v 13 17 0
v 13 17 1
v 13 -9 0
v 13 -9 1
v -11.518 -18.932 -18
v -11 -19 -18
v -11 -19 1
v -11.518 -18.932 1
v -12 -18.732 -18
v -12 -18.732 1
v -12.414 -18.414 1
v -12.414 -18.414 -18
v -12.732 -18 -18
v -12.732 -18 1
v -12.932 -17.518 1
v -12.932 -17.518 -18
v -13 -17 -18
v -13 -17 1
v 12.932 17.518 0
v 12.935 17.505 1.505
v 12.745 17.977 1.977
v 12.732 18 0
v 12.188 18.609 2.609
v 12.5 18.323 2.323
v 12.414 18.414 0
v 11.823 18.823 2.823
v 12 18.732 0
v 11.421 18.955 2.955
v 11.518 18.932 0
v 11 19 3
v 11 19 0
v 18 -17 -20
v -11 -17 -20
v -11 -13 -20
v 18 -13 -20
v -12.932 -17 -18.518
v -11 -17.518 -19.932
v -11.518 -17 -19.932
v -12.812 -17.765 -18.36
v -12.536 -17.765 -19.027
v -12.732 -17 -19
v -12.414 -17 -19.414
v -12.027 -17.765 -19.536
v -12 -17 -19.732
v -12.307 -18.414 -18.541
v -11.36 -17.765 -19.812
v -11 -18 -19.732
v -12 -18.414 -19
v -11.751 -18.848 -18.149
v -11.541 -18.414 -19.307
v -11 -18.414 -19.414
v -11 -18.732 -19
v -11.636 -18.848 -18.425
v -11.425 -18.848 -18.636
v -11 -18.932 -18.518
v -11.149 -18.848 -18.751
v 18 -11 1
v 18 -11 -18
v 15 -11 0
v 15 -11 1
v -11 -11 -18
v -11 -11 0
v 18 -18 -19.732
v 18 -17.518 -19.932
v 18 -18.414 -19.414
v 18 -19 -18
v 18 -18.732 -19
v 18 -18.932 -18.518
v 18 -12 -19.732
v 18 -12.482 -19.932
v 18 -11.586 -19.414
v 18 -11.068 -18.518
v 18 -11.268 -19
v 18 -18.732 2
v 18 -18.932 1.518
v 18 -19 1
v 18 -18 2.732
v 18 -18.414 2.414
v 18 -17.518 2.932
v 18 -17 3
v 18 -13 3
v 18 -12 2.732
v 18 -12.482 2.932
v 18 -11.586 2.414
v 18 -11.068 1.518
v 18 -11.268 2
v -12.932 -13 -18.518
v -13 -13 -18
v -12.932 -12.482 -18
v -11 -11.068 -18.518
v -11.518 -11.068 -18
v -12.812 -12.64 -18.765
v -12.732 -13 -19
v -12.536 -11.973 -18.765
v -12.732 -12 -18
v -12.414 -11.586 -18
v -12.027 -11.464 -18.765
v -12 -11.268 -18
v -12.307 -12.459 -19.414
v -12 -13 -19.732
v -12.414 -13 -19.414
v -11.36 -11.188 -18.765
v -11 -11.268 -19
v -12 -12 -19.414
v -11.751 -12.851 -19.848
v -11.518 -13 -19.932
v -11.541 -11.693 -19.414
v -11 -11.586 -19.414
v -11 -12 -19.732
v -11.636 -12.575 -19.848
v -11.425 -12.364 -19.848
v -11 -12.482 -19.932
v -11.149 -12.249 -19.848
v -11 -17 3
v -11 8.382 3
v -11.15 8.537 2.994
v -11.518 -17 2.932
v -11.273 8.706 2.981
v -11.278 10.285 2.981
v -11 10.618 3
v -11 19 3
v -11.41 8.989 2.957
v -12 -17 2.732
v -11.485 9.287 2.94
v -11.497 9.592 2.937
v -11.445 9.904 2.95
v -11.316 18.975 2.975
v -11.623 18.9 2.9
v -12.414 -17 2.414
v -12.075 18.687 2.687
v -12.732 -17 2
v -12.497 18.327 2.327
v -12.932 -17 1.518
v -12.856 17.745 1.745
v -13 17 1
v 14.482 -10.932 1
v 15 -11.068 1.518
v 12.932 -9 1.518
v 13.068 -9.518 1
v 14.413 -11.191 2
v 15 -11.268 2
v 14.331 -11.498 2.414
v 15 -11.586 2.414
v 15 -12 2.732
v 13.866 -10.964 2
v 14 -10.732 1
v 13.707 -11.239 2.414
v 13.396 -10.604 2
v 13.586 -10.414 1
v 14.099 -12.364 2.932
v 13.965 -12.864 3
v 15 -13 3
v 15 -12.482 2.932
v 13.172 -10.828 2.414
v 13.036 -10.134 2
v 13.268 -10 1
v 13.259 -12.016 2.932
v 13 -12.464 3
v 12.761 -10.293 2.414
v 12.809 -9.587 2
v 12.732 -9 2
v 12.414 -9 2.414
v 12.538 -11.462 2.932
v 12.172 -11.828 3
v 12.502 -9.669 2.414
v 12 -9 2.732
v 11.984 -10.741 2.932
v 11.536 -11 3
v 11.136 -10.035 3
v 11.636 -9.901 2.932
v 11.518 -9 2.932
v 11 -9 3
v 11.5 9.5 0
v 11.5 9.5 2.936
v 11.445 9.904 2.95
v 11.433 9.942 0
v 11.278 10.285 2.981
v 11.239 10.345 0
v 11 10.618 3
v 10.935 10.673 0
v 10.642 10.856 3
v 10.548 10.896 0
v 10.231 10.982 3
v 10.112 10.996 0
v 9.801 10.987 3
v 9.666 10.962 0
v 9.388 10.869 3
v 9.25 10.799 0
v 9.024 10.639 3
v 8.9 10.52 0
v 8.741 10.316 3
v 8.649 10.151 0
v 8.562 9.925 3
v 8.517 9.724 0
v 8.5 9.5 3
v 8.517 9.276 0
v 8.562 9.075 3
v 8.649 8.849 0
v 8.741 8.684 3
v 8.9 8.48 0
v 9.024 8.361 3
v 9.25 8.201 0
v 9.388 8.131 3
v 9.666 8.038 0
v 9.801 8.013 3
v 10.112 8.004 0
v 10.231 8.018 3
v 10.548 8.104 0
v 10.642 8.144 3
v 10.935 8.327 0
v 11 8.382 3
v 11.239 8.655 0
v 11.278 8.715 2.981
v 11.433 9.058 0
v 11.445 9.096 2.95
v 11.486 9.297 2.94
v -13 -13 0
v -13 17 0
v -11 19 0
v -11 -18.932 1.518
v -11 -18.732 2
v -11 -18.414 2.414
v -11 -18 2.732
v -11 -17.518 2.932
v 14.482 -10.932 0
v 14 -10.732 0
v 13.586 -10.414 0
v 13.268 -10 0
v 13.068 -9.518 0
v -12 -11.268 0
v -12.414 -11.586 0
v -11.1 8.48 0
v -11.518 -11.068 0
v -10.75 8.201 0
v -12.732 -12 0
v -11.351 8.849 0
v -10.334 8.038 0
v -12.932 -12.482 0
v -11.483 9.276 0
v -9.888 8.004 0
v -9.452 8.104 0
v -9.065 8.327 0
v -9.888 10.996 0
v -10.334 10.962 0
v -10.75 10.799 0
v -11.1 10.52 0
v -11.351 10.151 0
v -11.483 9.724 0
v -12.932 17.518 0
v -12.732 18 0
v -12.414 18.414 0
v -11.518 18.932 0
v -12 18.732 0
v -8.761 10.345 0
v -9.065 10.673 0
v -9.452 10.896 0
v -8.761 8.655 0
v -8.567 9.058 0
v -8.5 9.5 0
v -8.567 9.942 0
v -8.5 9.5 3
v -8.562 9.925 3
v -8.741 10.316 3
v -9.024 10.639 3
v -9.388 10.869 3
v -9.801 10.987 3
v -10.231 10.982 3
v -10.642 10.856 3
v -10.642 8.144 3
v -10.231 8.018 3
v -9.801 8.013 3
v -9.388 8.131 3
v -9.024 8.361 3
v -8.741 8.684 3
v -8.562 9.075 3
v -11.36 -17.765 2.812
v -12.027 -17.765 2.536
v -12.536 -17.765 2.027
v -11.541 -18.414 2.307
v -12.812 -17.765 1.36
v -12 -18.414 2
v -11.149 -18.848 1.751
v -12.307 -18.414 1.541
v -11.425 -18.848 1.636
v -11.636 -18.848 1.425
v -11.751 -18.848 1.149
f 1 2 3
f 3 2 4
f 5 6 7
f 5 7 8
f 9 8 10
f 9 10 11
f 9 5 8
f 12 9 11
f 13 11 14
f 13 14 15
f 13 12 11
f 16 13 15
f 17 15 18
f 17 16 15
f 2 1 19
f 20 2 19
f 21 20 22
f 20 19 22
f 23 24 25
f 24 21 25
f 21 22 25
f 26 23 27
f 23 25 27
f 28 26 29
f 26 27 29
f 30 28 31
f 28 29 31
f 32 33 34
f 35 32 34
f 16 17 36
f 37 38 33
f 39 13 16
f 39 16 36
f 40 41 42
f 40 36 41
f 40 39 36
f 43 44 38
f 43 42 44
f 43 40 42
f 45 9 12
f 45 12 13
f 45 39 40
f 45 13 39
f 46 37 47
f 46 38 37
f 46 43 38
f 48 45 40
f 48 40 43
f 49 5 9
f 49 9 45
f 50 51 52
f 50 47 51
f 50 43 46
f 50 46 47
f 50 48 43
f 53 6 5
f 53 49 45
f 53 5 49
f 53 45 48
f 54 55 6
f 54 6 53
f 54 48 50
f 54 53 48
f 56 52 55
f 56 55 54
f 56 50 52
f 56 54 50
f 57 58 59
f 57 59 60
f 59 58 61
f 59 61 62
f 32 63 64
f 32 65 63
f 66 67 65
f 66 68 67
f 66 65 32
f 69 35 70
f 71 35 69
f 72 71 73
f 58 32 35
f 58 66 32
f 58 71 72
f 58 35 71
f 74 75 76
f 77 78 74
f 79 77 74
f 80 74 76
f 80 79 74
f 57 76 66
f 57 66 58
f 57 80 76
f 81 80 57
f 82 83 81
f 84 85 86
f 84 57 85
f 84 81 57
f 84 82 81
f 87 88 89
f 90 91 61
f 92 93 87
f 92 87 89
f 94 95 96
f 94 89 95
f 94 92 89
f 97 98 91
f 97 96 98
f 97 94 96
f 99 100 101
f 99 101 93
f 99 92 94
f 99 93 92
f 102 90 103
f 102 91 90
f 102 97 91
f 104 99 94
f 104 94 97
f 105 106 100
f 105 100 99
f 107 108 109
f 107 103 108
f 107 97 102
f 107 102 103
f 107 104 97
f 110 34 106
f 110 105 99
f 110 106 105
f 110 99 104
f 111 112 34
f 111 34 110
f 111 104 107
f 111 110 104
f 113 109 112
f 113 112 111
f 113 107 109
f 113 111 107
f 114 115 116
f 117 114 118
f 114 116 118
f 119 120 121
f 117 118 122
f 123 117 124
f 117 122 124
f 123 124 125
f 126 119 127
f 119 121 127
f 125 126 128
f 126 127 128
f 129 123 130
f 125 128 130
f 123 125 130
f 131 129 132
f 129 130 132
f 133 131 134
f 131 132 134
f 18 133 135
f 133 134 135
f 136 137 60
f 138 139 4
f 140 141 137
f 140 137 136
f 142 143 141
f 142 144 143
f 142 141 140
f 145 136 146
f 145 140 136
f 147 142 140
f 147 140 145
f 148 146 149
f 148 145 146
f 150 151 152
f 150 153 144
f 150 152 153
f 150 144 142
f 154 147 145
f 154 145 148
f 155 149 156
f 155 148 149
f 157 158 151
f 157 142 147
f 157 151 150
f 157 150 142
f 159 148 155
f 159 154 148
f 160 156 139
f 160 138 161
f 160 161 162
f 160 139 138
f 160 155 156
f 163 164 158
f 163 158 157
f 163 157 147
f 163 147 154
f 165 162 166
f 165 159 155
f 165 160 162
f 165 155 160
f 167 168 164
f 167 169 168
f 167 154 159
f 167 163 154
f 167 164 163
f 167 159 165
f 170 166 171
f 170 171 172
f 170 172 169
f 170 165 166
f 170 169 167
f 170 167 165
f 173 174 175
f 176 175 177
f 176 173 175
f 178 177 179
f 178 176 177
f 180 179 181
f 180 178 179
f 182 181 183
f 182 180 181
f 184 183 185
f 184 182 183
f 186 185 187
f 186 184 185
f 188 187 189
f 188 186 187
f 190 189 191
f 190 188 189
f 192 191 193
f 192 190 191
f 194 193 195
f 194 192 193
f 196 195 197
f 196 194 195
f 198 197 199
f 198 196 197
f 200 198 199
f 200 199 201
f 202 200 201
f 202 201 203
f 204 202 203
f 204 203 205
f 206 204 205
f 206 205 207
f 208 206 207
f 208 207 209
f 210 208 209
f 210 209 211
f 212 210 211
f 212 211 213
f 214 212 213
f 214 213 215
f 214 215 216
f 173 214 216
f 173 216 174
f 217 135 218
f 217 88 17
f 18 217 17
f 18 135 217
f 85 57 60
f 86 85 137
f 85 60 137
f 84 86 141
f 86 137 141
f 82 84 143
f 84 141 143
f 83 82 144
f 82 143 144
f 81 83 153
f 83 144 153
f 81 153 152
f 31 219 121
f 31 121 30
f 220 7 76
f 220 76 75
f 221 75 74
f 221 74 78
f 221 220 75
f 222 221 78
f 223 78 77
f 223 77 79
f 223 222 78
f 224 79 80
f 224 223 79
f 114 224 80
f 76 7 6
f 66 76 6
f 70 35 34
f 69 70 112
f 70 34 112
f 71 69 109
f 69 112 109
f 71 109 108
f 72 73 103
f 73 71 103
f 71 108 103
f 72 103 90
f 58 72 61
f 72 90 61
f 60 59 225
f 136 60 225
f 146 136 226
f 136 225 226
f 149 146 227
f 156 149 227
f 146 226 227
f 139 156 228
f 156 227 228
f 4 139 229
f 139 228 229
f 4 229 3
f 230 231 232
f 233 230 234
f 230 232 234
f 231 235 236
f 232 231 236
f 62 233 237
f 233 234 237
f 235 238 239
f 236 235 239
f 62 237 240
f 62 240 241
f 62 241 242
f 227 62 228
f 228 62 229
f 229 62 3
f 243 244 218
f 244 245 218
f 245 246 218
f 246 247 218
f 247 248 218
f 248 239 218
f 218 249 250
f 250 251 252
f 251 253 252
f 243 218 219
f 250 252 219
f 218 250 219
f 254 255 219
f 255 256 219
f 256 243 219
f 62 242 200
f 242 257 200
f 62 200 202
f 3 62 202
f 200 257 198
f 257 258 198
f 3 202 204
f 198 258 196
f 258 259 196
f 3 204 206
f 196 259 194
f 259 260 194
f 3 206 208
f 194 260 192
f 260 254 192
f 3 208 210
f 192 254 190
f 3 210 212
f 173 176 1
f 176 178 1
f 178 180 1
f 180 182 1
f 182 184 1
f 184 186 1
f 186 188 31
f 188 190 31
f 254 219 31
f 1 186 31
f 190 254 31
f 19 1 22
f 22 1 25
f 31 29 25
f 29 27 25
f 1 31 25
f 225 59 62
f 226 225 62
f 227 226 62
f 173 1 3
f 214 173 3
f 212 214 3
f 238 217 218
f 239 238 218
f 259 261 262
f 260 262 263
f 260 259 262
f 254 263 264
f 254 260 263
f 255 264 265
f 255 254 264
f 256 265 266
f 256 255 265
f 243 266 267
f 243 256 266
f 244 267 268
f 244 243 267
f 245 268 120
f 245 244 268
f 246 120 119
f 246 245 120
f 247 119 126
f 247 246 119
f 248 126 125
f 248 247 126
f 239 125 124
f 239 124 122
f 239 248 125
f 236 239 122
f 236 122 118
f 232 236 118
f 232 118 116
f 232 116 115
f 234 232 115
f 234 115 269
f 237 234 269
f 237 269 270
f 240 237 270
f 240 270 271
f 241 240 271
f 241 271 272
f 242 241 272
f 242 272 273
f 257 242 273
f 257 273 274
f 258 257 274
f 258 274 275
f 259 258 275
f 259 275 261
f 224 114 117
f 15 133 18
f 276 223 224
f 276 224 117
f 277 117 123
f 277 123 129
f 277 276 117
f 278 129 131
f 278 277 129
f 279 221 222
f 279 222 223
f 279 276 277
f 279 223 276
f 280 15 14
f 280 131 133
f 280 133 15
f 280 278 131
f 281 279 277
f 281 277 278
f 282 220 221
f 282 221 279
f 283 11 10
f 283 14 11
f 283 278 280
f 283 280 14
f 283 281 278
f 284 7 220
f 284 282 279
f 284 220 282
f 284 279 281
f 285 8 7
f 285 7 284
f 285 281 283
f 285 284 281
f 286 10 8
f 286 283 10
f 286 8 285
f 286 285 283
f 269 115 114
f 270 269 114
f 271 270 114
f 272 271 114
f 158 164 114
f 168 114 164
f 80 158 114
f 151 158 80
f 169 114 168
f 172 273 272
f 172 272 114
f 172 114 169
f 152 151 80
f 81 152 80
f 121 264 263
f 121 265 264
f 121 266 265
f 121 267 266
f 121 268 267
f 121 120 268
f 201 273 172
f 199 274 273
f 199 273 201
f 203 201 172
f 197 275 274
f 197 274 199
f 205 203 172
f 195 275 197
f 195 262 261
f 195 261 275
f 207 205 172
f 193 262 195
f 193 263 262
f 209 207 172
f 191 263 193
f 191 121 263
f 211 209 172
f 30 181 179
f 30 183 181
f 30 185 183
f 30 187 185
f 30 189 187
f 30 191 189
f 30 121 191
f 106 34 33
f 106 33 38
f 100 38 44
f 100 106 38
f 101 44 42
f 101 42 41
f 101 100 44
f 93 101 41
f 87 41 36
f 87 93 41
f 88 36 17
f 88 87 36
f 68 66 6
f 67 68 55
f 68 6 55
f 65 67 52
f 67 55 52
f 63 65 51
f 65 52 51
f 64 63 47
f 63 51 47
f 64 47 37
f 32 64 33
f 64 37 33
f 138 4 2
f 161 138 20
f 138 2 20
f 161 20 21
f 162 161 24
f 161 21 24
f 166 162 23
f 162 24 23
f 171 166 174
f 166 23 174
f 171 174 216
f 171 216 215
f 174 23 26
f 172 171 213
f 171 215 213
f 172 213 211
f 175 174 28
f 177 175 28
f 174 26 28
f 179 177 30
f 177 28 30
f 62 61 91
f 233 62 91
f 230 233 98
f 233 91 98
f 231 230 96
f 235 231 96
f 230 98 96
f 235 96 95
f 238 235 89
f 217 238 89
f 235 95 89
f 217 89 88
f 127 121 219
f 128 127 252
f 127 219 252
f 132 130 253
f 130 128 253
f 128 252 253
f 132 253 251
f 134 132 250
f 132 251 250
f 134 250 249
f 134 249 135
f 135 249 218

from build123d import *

# Parameters (mm, degrees)
F0_W         = 26
F0_H         = 38
F0_R         = 1.5
F1_DEPTH     = 3
F2_W         = 26
F2_H         = 8
F3_DEPTH     = 20
F5_DEPTH     = 5
F6_T1_DEPTH  = 3
F6_T3_DEPTH  = 18
F6_T5_DEPTH  = 19
F6_T7_DEPTH  = 13
F6_T9_DEPTH  = 41
F6_T11_DEPTH = 33
F6_T13_DEPTH = 34
F6_T15_DEPTH = 4
F6_T17_DEPTH = 8
F6_S21_W     = 2.04
F6_S21_H     = 2.04
F6_T22_DEPTH = 2.04
F6_S27_W     = 2.04
F6_S27_H     = 2.04
F6_T28_DEPTH = 2.04
F6_S33_W     = 2.04
F6_S33_H     = 2.04
F6_T34_DEPTH = 2.04
F6_T38_ANGLE = 90


# Not quite as in the source:
# - a fillet or chamfer that OpenCascade refuses, or shapes differently, is made with other operations: its cross-section is extruded or revolved along the edge and cut away or added


with BuildPart() as f1:
    # F0 (on Top) → F1 (new body)
    with BuildSketch(Plane.XY):
        Rectangle(F0_W, F0_H)
        with Locations((-10, 9.5)):
            Circle(F0_R, mode=Mode.SUBTRACT)
        with Locations((10, 9.5)):
            Circle(F0_R, mode=Mode.SUBTRACT)
    extrude(amount=F1_DEPTH)

    # F2 (on face) → F3 (join)
    with BuildSketch(Plane(origin=(0, 0, 0), x_dir=(1, 0, 0), z_dir=(0, 0, -1))):
        with Locations((0, 15)):
            Rectangle(F2_W, F2_H)
    extrude(amount=F3_DEPTH)

    # F4 (on face) → F5 (join)
    with BuildSketch(Plane.YZ.offset(13)):
        Polygon((-11, -20), (-11, 0), (-11, 3), (-19, 3), (-19, -20), align=None)
    extrude(amount=F5_DEPTH)

    # F6: fillet of radius 2 on 12 edges, made by hand

    # F6_s2 → F6_t1 (join)
    with BuildSketch(Plane.XY):
        with BuildLine():
            ThreePointArc((15, -11), (13.5857864376, -10.4142135624), (13, -9))
            Line((13, -9), (13, -11))
            Line((13, -11), (15, -11))
        make_face()
    extrude(amount=F6_T1_DEPTH)

    # F6_s4 → F6_t3 (cut)
    with BuildSketch(Plane.XY.offset(-18)):
        with BuildLine():
            ThreePointArc((-11, -11), (-12.4142135624, -11.5857864376), (-13, -13))
            Line((-13, -13), (-13, -11))
            Line((-13, -11), (-11, -11))
        make_face()
    extrude(amount=F6_T3_DEPTH, mode=Mode.SUBTRACT)

    # F6_s6 → F6_t5 (cut)
    with BuildSketch(Plane.XY.offset(-18)):
        with BuildLine():
            ThreePointArc((-11, -19), (-12.4142135624, -18.4142135624), (-13, -17))
            Line((-13, -17), (-13, -19))
            Line((-13, -19), (-11, -19))
        make_face()
    extrude(amount=F6_T5_DEPTH, mode=Mode.SUBTRACT)

    # F6_s8 → F6_t7 (cut)
    with BuildSketch(Plane.XY.offset(-5)):
        with BuildLine():
            ThreePointArc((13, 17), (12.4142135624, 18.4142135624), (11, 19))
            Line((11, 19), (13, 19))
            Line((13, 19), (13, 17))
        make_face()
        with BuildLine():
            ThreePointArc((-11, 19), (-12.4142135624, 18.4142135624), (-13, 17))
            Line((-13, 17), (-13, 19))
            Line((-13, 19), (-11, 19))
        make_face()
    extrude(amount=F6_T7_DEPTH, mode=Mode.SUBTRACT)

    # F6_s10 → F6_t9 (cut)
    with BuildSketch(Plane.XZ.offset(-24)):
        with BuildLine():
            ThreePointArc((-11, 3), (-12.4142135624, 2.4142135624), (-13, 1))
            Line((-13, 1), (-13, 3))
            Line((-13, 3), (-11, 3))
        make_face()
    extrude(amount=F6_T9_DEPTH, mode=Mode.SUBTRACT)

    # F6_s12 → F6_t11 (cut)
    with BuildSketch(Plane.XZ.offset(-24)):
        with BuildLine():
            ThreePointArc((13, 1), (12.4142135624, 2.4142135624), (11, 3))
            Line((11, 3), (13, 3))
            Line((13, 3), (13, 1))
        make_face()
    extrude(amount=F6_T11_DEPTH, mode=Mode.SUBTRACT)

    # F6_s14 → F6_t13 (cut)
    with BuildSketch(Plane.YZ.offset(-11)):
        with BuildLine():
            ThreePointArc((-13, -20), (-11.5857864376, -19.4142135624), (-11, -18))
            Line((-11, -18), (-11, -20))
            Line((-11, -20), (-13, -20))
        make_face()
        with BuildLine():
            ThreePointArc((-19, -18), (-18.4142135624, -19.4142135624), (-17, -20))
            Line((-17, -20), (-19, -20))
            Line((-19, -20), (-19, -18))
        make_face()
        with BuildLine():
            ThreePointArc((-19, 1), (-18.4142135624, 2.4142135624), (-17, 3))
            Line((-17, 3), (-19, 3))
            Line((-19, 3), (-19, 1))
        make_face()
    extrude(amount=F6_T13_DEPTH, mode=Mode.SUBTRACT)

    # F6_s16 → F6_t15 (cut)
    with BuildSketch(Plane.XZ.offset(13)):
        with BuildLine():
            ThreePointArc((-11, -20), (-12.4142135624, -19.4142135624), (-13, -18))
            Line((-13, -18), (-13, -20))
            Line((-13, -20), (-11, -20))
        make_face()
    extrude(amount=F6_T15_DEPTH, mode=Mode.SUBTRACT)

    # F6_s18 → F6_t17 (cut)
    with BuildSketch(Plane.YZ.offset(15)):
        with BuildLine():
            ThreePointArc((-11, 1), (-11.5857864376, 2.4142135624), (-13, 3))
            Line((-13, 3), (-11, 3))
            Line((-11, 3), (-11, 1))
        make_face()
    extrude(amount=F6_T17_DEPTH, mode=Mode.SUBTRACT)


with BuildPart() as f6_tool20:
    # F6_s21 → F6_t22 (new body)
    with BuildSketch(Plane.XY.offset(-18)):
        with Locations((-12.02, -11.98)):
            Rectangle(F6_S21_W, F6_S21_H)
    extrude(amount=-F6_T22_DEPTH)

    # F6_s23 → F6_t24 (revolve, cut)
    with BuildSketch(Plane(origin=(-11, -13, -18), x_dir=(0.7071067812, -0.7071067812, 0), z_dir=(0.7071067812, 0.7071067812, 0))):
        with BuildLine():
            ThreePointArc((0, -2), (2, 0), (0, 2))
            Line((0, 2), (0, -2))
        make_face()
    revolve(axis=Axis((-11, -13, -18), (0, 0, -1)), mode=Mode.SUBTRACT)


with BuildPart() as f1_1:
    add(f1.part)

    # F6_t19: cut F6_tool20
    add(f6_tool20.part, mode=Mode.SUBTRACT)


with BuildPart() as f6_tool26:
    # F6_s27 → F6_t28 (new body)
    with BuildSketch(Plane.XZ.offset(17)):
        with Locations((-12.02, 2.02)):
            Rectangle(F6_S27_W, F6_S27_H)
    extrude(amount=F6_T28_DEPTH)

    # F6_s29 → F6_t30 (revolve, cut)
    with BuildSketch(Plane(origin=(-11, -17, 1), x_dir=(0.7071067812, 0, -0.7071067812), z_dir=(-0.7071067812, 0, -0.7071067812))):
        with BuildLine():
            ThreePointArc((0, -2), (2, 0), (0, 2))
            Line((0, 2), (0, -2))
        make_face()
    revolve(axis=Axis((-11, -17, 1), (0, -1, 0)), mode=Mode.SUBTRACT)


with BuildPart() as f1_2:
    add(f1_1.part)

    # F6_t25: cut F6_tool26
    add(f6_tool26.part, mode=Mode.SUBTRACT)


with BuildPart() as f6_tool32:
    # F6_s33 → F6_t34 (new body)
    with BuildSketch(Plane.XZ.offset(17)):
        with Locations((-12.02, -19.02)):
            Rectangle(F6_S33_W, F6_S33_H)
    extrude(amount=F6_T34_DEPTH)

    # F6_s35 → F6_t36 (revolve, cut)
    with BuildSketch(Plane(origin=(-11, -17, -18), x_dir=(0.7071067812, 0, 0.7071067812), z_dir=(0.7071067812, 0, -0.7071067812))):
        with BuildLine():
            ThreePointArc((0, -2), (2, 0), (0, 2))
            Line((0, 2), (0, -2))
        make_face()
    revolve(axis=Axis((-11, -17, -18), (0, -1, 0)), mode=Mode.SUBTRACT)


with BuildPart() as f1_3:
    add(f1_2.part)

    # F6_t31: cut F6_tool32
    add(f6_tool32.part, mode=Mode.SUBTRACT)

    # F6_s37 → F6_t38 (revolve, cut)
    with BuildSketch(Plane.YZ.offset(15)):
        with BuildLine():
            ThreePointArc((-11, 1), (-11.5857864376, 2.4142135624), (-13, 3))
            Line((-13, 3), (-11, 3))
            Line((-11, 3), (-11, 1))
        make_face()
    revolve(axis=Axis((15, -9, 3), (0, 0, -1)), revolution_arc=F6_T38_ANGLE, mode=Mode.SUBTRACT)


solid = f1_3.part
